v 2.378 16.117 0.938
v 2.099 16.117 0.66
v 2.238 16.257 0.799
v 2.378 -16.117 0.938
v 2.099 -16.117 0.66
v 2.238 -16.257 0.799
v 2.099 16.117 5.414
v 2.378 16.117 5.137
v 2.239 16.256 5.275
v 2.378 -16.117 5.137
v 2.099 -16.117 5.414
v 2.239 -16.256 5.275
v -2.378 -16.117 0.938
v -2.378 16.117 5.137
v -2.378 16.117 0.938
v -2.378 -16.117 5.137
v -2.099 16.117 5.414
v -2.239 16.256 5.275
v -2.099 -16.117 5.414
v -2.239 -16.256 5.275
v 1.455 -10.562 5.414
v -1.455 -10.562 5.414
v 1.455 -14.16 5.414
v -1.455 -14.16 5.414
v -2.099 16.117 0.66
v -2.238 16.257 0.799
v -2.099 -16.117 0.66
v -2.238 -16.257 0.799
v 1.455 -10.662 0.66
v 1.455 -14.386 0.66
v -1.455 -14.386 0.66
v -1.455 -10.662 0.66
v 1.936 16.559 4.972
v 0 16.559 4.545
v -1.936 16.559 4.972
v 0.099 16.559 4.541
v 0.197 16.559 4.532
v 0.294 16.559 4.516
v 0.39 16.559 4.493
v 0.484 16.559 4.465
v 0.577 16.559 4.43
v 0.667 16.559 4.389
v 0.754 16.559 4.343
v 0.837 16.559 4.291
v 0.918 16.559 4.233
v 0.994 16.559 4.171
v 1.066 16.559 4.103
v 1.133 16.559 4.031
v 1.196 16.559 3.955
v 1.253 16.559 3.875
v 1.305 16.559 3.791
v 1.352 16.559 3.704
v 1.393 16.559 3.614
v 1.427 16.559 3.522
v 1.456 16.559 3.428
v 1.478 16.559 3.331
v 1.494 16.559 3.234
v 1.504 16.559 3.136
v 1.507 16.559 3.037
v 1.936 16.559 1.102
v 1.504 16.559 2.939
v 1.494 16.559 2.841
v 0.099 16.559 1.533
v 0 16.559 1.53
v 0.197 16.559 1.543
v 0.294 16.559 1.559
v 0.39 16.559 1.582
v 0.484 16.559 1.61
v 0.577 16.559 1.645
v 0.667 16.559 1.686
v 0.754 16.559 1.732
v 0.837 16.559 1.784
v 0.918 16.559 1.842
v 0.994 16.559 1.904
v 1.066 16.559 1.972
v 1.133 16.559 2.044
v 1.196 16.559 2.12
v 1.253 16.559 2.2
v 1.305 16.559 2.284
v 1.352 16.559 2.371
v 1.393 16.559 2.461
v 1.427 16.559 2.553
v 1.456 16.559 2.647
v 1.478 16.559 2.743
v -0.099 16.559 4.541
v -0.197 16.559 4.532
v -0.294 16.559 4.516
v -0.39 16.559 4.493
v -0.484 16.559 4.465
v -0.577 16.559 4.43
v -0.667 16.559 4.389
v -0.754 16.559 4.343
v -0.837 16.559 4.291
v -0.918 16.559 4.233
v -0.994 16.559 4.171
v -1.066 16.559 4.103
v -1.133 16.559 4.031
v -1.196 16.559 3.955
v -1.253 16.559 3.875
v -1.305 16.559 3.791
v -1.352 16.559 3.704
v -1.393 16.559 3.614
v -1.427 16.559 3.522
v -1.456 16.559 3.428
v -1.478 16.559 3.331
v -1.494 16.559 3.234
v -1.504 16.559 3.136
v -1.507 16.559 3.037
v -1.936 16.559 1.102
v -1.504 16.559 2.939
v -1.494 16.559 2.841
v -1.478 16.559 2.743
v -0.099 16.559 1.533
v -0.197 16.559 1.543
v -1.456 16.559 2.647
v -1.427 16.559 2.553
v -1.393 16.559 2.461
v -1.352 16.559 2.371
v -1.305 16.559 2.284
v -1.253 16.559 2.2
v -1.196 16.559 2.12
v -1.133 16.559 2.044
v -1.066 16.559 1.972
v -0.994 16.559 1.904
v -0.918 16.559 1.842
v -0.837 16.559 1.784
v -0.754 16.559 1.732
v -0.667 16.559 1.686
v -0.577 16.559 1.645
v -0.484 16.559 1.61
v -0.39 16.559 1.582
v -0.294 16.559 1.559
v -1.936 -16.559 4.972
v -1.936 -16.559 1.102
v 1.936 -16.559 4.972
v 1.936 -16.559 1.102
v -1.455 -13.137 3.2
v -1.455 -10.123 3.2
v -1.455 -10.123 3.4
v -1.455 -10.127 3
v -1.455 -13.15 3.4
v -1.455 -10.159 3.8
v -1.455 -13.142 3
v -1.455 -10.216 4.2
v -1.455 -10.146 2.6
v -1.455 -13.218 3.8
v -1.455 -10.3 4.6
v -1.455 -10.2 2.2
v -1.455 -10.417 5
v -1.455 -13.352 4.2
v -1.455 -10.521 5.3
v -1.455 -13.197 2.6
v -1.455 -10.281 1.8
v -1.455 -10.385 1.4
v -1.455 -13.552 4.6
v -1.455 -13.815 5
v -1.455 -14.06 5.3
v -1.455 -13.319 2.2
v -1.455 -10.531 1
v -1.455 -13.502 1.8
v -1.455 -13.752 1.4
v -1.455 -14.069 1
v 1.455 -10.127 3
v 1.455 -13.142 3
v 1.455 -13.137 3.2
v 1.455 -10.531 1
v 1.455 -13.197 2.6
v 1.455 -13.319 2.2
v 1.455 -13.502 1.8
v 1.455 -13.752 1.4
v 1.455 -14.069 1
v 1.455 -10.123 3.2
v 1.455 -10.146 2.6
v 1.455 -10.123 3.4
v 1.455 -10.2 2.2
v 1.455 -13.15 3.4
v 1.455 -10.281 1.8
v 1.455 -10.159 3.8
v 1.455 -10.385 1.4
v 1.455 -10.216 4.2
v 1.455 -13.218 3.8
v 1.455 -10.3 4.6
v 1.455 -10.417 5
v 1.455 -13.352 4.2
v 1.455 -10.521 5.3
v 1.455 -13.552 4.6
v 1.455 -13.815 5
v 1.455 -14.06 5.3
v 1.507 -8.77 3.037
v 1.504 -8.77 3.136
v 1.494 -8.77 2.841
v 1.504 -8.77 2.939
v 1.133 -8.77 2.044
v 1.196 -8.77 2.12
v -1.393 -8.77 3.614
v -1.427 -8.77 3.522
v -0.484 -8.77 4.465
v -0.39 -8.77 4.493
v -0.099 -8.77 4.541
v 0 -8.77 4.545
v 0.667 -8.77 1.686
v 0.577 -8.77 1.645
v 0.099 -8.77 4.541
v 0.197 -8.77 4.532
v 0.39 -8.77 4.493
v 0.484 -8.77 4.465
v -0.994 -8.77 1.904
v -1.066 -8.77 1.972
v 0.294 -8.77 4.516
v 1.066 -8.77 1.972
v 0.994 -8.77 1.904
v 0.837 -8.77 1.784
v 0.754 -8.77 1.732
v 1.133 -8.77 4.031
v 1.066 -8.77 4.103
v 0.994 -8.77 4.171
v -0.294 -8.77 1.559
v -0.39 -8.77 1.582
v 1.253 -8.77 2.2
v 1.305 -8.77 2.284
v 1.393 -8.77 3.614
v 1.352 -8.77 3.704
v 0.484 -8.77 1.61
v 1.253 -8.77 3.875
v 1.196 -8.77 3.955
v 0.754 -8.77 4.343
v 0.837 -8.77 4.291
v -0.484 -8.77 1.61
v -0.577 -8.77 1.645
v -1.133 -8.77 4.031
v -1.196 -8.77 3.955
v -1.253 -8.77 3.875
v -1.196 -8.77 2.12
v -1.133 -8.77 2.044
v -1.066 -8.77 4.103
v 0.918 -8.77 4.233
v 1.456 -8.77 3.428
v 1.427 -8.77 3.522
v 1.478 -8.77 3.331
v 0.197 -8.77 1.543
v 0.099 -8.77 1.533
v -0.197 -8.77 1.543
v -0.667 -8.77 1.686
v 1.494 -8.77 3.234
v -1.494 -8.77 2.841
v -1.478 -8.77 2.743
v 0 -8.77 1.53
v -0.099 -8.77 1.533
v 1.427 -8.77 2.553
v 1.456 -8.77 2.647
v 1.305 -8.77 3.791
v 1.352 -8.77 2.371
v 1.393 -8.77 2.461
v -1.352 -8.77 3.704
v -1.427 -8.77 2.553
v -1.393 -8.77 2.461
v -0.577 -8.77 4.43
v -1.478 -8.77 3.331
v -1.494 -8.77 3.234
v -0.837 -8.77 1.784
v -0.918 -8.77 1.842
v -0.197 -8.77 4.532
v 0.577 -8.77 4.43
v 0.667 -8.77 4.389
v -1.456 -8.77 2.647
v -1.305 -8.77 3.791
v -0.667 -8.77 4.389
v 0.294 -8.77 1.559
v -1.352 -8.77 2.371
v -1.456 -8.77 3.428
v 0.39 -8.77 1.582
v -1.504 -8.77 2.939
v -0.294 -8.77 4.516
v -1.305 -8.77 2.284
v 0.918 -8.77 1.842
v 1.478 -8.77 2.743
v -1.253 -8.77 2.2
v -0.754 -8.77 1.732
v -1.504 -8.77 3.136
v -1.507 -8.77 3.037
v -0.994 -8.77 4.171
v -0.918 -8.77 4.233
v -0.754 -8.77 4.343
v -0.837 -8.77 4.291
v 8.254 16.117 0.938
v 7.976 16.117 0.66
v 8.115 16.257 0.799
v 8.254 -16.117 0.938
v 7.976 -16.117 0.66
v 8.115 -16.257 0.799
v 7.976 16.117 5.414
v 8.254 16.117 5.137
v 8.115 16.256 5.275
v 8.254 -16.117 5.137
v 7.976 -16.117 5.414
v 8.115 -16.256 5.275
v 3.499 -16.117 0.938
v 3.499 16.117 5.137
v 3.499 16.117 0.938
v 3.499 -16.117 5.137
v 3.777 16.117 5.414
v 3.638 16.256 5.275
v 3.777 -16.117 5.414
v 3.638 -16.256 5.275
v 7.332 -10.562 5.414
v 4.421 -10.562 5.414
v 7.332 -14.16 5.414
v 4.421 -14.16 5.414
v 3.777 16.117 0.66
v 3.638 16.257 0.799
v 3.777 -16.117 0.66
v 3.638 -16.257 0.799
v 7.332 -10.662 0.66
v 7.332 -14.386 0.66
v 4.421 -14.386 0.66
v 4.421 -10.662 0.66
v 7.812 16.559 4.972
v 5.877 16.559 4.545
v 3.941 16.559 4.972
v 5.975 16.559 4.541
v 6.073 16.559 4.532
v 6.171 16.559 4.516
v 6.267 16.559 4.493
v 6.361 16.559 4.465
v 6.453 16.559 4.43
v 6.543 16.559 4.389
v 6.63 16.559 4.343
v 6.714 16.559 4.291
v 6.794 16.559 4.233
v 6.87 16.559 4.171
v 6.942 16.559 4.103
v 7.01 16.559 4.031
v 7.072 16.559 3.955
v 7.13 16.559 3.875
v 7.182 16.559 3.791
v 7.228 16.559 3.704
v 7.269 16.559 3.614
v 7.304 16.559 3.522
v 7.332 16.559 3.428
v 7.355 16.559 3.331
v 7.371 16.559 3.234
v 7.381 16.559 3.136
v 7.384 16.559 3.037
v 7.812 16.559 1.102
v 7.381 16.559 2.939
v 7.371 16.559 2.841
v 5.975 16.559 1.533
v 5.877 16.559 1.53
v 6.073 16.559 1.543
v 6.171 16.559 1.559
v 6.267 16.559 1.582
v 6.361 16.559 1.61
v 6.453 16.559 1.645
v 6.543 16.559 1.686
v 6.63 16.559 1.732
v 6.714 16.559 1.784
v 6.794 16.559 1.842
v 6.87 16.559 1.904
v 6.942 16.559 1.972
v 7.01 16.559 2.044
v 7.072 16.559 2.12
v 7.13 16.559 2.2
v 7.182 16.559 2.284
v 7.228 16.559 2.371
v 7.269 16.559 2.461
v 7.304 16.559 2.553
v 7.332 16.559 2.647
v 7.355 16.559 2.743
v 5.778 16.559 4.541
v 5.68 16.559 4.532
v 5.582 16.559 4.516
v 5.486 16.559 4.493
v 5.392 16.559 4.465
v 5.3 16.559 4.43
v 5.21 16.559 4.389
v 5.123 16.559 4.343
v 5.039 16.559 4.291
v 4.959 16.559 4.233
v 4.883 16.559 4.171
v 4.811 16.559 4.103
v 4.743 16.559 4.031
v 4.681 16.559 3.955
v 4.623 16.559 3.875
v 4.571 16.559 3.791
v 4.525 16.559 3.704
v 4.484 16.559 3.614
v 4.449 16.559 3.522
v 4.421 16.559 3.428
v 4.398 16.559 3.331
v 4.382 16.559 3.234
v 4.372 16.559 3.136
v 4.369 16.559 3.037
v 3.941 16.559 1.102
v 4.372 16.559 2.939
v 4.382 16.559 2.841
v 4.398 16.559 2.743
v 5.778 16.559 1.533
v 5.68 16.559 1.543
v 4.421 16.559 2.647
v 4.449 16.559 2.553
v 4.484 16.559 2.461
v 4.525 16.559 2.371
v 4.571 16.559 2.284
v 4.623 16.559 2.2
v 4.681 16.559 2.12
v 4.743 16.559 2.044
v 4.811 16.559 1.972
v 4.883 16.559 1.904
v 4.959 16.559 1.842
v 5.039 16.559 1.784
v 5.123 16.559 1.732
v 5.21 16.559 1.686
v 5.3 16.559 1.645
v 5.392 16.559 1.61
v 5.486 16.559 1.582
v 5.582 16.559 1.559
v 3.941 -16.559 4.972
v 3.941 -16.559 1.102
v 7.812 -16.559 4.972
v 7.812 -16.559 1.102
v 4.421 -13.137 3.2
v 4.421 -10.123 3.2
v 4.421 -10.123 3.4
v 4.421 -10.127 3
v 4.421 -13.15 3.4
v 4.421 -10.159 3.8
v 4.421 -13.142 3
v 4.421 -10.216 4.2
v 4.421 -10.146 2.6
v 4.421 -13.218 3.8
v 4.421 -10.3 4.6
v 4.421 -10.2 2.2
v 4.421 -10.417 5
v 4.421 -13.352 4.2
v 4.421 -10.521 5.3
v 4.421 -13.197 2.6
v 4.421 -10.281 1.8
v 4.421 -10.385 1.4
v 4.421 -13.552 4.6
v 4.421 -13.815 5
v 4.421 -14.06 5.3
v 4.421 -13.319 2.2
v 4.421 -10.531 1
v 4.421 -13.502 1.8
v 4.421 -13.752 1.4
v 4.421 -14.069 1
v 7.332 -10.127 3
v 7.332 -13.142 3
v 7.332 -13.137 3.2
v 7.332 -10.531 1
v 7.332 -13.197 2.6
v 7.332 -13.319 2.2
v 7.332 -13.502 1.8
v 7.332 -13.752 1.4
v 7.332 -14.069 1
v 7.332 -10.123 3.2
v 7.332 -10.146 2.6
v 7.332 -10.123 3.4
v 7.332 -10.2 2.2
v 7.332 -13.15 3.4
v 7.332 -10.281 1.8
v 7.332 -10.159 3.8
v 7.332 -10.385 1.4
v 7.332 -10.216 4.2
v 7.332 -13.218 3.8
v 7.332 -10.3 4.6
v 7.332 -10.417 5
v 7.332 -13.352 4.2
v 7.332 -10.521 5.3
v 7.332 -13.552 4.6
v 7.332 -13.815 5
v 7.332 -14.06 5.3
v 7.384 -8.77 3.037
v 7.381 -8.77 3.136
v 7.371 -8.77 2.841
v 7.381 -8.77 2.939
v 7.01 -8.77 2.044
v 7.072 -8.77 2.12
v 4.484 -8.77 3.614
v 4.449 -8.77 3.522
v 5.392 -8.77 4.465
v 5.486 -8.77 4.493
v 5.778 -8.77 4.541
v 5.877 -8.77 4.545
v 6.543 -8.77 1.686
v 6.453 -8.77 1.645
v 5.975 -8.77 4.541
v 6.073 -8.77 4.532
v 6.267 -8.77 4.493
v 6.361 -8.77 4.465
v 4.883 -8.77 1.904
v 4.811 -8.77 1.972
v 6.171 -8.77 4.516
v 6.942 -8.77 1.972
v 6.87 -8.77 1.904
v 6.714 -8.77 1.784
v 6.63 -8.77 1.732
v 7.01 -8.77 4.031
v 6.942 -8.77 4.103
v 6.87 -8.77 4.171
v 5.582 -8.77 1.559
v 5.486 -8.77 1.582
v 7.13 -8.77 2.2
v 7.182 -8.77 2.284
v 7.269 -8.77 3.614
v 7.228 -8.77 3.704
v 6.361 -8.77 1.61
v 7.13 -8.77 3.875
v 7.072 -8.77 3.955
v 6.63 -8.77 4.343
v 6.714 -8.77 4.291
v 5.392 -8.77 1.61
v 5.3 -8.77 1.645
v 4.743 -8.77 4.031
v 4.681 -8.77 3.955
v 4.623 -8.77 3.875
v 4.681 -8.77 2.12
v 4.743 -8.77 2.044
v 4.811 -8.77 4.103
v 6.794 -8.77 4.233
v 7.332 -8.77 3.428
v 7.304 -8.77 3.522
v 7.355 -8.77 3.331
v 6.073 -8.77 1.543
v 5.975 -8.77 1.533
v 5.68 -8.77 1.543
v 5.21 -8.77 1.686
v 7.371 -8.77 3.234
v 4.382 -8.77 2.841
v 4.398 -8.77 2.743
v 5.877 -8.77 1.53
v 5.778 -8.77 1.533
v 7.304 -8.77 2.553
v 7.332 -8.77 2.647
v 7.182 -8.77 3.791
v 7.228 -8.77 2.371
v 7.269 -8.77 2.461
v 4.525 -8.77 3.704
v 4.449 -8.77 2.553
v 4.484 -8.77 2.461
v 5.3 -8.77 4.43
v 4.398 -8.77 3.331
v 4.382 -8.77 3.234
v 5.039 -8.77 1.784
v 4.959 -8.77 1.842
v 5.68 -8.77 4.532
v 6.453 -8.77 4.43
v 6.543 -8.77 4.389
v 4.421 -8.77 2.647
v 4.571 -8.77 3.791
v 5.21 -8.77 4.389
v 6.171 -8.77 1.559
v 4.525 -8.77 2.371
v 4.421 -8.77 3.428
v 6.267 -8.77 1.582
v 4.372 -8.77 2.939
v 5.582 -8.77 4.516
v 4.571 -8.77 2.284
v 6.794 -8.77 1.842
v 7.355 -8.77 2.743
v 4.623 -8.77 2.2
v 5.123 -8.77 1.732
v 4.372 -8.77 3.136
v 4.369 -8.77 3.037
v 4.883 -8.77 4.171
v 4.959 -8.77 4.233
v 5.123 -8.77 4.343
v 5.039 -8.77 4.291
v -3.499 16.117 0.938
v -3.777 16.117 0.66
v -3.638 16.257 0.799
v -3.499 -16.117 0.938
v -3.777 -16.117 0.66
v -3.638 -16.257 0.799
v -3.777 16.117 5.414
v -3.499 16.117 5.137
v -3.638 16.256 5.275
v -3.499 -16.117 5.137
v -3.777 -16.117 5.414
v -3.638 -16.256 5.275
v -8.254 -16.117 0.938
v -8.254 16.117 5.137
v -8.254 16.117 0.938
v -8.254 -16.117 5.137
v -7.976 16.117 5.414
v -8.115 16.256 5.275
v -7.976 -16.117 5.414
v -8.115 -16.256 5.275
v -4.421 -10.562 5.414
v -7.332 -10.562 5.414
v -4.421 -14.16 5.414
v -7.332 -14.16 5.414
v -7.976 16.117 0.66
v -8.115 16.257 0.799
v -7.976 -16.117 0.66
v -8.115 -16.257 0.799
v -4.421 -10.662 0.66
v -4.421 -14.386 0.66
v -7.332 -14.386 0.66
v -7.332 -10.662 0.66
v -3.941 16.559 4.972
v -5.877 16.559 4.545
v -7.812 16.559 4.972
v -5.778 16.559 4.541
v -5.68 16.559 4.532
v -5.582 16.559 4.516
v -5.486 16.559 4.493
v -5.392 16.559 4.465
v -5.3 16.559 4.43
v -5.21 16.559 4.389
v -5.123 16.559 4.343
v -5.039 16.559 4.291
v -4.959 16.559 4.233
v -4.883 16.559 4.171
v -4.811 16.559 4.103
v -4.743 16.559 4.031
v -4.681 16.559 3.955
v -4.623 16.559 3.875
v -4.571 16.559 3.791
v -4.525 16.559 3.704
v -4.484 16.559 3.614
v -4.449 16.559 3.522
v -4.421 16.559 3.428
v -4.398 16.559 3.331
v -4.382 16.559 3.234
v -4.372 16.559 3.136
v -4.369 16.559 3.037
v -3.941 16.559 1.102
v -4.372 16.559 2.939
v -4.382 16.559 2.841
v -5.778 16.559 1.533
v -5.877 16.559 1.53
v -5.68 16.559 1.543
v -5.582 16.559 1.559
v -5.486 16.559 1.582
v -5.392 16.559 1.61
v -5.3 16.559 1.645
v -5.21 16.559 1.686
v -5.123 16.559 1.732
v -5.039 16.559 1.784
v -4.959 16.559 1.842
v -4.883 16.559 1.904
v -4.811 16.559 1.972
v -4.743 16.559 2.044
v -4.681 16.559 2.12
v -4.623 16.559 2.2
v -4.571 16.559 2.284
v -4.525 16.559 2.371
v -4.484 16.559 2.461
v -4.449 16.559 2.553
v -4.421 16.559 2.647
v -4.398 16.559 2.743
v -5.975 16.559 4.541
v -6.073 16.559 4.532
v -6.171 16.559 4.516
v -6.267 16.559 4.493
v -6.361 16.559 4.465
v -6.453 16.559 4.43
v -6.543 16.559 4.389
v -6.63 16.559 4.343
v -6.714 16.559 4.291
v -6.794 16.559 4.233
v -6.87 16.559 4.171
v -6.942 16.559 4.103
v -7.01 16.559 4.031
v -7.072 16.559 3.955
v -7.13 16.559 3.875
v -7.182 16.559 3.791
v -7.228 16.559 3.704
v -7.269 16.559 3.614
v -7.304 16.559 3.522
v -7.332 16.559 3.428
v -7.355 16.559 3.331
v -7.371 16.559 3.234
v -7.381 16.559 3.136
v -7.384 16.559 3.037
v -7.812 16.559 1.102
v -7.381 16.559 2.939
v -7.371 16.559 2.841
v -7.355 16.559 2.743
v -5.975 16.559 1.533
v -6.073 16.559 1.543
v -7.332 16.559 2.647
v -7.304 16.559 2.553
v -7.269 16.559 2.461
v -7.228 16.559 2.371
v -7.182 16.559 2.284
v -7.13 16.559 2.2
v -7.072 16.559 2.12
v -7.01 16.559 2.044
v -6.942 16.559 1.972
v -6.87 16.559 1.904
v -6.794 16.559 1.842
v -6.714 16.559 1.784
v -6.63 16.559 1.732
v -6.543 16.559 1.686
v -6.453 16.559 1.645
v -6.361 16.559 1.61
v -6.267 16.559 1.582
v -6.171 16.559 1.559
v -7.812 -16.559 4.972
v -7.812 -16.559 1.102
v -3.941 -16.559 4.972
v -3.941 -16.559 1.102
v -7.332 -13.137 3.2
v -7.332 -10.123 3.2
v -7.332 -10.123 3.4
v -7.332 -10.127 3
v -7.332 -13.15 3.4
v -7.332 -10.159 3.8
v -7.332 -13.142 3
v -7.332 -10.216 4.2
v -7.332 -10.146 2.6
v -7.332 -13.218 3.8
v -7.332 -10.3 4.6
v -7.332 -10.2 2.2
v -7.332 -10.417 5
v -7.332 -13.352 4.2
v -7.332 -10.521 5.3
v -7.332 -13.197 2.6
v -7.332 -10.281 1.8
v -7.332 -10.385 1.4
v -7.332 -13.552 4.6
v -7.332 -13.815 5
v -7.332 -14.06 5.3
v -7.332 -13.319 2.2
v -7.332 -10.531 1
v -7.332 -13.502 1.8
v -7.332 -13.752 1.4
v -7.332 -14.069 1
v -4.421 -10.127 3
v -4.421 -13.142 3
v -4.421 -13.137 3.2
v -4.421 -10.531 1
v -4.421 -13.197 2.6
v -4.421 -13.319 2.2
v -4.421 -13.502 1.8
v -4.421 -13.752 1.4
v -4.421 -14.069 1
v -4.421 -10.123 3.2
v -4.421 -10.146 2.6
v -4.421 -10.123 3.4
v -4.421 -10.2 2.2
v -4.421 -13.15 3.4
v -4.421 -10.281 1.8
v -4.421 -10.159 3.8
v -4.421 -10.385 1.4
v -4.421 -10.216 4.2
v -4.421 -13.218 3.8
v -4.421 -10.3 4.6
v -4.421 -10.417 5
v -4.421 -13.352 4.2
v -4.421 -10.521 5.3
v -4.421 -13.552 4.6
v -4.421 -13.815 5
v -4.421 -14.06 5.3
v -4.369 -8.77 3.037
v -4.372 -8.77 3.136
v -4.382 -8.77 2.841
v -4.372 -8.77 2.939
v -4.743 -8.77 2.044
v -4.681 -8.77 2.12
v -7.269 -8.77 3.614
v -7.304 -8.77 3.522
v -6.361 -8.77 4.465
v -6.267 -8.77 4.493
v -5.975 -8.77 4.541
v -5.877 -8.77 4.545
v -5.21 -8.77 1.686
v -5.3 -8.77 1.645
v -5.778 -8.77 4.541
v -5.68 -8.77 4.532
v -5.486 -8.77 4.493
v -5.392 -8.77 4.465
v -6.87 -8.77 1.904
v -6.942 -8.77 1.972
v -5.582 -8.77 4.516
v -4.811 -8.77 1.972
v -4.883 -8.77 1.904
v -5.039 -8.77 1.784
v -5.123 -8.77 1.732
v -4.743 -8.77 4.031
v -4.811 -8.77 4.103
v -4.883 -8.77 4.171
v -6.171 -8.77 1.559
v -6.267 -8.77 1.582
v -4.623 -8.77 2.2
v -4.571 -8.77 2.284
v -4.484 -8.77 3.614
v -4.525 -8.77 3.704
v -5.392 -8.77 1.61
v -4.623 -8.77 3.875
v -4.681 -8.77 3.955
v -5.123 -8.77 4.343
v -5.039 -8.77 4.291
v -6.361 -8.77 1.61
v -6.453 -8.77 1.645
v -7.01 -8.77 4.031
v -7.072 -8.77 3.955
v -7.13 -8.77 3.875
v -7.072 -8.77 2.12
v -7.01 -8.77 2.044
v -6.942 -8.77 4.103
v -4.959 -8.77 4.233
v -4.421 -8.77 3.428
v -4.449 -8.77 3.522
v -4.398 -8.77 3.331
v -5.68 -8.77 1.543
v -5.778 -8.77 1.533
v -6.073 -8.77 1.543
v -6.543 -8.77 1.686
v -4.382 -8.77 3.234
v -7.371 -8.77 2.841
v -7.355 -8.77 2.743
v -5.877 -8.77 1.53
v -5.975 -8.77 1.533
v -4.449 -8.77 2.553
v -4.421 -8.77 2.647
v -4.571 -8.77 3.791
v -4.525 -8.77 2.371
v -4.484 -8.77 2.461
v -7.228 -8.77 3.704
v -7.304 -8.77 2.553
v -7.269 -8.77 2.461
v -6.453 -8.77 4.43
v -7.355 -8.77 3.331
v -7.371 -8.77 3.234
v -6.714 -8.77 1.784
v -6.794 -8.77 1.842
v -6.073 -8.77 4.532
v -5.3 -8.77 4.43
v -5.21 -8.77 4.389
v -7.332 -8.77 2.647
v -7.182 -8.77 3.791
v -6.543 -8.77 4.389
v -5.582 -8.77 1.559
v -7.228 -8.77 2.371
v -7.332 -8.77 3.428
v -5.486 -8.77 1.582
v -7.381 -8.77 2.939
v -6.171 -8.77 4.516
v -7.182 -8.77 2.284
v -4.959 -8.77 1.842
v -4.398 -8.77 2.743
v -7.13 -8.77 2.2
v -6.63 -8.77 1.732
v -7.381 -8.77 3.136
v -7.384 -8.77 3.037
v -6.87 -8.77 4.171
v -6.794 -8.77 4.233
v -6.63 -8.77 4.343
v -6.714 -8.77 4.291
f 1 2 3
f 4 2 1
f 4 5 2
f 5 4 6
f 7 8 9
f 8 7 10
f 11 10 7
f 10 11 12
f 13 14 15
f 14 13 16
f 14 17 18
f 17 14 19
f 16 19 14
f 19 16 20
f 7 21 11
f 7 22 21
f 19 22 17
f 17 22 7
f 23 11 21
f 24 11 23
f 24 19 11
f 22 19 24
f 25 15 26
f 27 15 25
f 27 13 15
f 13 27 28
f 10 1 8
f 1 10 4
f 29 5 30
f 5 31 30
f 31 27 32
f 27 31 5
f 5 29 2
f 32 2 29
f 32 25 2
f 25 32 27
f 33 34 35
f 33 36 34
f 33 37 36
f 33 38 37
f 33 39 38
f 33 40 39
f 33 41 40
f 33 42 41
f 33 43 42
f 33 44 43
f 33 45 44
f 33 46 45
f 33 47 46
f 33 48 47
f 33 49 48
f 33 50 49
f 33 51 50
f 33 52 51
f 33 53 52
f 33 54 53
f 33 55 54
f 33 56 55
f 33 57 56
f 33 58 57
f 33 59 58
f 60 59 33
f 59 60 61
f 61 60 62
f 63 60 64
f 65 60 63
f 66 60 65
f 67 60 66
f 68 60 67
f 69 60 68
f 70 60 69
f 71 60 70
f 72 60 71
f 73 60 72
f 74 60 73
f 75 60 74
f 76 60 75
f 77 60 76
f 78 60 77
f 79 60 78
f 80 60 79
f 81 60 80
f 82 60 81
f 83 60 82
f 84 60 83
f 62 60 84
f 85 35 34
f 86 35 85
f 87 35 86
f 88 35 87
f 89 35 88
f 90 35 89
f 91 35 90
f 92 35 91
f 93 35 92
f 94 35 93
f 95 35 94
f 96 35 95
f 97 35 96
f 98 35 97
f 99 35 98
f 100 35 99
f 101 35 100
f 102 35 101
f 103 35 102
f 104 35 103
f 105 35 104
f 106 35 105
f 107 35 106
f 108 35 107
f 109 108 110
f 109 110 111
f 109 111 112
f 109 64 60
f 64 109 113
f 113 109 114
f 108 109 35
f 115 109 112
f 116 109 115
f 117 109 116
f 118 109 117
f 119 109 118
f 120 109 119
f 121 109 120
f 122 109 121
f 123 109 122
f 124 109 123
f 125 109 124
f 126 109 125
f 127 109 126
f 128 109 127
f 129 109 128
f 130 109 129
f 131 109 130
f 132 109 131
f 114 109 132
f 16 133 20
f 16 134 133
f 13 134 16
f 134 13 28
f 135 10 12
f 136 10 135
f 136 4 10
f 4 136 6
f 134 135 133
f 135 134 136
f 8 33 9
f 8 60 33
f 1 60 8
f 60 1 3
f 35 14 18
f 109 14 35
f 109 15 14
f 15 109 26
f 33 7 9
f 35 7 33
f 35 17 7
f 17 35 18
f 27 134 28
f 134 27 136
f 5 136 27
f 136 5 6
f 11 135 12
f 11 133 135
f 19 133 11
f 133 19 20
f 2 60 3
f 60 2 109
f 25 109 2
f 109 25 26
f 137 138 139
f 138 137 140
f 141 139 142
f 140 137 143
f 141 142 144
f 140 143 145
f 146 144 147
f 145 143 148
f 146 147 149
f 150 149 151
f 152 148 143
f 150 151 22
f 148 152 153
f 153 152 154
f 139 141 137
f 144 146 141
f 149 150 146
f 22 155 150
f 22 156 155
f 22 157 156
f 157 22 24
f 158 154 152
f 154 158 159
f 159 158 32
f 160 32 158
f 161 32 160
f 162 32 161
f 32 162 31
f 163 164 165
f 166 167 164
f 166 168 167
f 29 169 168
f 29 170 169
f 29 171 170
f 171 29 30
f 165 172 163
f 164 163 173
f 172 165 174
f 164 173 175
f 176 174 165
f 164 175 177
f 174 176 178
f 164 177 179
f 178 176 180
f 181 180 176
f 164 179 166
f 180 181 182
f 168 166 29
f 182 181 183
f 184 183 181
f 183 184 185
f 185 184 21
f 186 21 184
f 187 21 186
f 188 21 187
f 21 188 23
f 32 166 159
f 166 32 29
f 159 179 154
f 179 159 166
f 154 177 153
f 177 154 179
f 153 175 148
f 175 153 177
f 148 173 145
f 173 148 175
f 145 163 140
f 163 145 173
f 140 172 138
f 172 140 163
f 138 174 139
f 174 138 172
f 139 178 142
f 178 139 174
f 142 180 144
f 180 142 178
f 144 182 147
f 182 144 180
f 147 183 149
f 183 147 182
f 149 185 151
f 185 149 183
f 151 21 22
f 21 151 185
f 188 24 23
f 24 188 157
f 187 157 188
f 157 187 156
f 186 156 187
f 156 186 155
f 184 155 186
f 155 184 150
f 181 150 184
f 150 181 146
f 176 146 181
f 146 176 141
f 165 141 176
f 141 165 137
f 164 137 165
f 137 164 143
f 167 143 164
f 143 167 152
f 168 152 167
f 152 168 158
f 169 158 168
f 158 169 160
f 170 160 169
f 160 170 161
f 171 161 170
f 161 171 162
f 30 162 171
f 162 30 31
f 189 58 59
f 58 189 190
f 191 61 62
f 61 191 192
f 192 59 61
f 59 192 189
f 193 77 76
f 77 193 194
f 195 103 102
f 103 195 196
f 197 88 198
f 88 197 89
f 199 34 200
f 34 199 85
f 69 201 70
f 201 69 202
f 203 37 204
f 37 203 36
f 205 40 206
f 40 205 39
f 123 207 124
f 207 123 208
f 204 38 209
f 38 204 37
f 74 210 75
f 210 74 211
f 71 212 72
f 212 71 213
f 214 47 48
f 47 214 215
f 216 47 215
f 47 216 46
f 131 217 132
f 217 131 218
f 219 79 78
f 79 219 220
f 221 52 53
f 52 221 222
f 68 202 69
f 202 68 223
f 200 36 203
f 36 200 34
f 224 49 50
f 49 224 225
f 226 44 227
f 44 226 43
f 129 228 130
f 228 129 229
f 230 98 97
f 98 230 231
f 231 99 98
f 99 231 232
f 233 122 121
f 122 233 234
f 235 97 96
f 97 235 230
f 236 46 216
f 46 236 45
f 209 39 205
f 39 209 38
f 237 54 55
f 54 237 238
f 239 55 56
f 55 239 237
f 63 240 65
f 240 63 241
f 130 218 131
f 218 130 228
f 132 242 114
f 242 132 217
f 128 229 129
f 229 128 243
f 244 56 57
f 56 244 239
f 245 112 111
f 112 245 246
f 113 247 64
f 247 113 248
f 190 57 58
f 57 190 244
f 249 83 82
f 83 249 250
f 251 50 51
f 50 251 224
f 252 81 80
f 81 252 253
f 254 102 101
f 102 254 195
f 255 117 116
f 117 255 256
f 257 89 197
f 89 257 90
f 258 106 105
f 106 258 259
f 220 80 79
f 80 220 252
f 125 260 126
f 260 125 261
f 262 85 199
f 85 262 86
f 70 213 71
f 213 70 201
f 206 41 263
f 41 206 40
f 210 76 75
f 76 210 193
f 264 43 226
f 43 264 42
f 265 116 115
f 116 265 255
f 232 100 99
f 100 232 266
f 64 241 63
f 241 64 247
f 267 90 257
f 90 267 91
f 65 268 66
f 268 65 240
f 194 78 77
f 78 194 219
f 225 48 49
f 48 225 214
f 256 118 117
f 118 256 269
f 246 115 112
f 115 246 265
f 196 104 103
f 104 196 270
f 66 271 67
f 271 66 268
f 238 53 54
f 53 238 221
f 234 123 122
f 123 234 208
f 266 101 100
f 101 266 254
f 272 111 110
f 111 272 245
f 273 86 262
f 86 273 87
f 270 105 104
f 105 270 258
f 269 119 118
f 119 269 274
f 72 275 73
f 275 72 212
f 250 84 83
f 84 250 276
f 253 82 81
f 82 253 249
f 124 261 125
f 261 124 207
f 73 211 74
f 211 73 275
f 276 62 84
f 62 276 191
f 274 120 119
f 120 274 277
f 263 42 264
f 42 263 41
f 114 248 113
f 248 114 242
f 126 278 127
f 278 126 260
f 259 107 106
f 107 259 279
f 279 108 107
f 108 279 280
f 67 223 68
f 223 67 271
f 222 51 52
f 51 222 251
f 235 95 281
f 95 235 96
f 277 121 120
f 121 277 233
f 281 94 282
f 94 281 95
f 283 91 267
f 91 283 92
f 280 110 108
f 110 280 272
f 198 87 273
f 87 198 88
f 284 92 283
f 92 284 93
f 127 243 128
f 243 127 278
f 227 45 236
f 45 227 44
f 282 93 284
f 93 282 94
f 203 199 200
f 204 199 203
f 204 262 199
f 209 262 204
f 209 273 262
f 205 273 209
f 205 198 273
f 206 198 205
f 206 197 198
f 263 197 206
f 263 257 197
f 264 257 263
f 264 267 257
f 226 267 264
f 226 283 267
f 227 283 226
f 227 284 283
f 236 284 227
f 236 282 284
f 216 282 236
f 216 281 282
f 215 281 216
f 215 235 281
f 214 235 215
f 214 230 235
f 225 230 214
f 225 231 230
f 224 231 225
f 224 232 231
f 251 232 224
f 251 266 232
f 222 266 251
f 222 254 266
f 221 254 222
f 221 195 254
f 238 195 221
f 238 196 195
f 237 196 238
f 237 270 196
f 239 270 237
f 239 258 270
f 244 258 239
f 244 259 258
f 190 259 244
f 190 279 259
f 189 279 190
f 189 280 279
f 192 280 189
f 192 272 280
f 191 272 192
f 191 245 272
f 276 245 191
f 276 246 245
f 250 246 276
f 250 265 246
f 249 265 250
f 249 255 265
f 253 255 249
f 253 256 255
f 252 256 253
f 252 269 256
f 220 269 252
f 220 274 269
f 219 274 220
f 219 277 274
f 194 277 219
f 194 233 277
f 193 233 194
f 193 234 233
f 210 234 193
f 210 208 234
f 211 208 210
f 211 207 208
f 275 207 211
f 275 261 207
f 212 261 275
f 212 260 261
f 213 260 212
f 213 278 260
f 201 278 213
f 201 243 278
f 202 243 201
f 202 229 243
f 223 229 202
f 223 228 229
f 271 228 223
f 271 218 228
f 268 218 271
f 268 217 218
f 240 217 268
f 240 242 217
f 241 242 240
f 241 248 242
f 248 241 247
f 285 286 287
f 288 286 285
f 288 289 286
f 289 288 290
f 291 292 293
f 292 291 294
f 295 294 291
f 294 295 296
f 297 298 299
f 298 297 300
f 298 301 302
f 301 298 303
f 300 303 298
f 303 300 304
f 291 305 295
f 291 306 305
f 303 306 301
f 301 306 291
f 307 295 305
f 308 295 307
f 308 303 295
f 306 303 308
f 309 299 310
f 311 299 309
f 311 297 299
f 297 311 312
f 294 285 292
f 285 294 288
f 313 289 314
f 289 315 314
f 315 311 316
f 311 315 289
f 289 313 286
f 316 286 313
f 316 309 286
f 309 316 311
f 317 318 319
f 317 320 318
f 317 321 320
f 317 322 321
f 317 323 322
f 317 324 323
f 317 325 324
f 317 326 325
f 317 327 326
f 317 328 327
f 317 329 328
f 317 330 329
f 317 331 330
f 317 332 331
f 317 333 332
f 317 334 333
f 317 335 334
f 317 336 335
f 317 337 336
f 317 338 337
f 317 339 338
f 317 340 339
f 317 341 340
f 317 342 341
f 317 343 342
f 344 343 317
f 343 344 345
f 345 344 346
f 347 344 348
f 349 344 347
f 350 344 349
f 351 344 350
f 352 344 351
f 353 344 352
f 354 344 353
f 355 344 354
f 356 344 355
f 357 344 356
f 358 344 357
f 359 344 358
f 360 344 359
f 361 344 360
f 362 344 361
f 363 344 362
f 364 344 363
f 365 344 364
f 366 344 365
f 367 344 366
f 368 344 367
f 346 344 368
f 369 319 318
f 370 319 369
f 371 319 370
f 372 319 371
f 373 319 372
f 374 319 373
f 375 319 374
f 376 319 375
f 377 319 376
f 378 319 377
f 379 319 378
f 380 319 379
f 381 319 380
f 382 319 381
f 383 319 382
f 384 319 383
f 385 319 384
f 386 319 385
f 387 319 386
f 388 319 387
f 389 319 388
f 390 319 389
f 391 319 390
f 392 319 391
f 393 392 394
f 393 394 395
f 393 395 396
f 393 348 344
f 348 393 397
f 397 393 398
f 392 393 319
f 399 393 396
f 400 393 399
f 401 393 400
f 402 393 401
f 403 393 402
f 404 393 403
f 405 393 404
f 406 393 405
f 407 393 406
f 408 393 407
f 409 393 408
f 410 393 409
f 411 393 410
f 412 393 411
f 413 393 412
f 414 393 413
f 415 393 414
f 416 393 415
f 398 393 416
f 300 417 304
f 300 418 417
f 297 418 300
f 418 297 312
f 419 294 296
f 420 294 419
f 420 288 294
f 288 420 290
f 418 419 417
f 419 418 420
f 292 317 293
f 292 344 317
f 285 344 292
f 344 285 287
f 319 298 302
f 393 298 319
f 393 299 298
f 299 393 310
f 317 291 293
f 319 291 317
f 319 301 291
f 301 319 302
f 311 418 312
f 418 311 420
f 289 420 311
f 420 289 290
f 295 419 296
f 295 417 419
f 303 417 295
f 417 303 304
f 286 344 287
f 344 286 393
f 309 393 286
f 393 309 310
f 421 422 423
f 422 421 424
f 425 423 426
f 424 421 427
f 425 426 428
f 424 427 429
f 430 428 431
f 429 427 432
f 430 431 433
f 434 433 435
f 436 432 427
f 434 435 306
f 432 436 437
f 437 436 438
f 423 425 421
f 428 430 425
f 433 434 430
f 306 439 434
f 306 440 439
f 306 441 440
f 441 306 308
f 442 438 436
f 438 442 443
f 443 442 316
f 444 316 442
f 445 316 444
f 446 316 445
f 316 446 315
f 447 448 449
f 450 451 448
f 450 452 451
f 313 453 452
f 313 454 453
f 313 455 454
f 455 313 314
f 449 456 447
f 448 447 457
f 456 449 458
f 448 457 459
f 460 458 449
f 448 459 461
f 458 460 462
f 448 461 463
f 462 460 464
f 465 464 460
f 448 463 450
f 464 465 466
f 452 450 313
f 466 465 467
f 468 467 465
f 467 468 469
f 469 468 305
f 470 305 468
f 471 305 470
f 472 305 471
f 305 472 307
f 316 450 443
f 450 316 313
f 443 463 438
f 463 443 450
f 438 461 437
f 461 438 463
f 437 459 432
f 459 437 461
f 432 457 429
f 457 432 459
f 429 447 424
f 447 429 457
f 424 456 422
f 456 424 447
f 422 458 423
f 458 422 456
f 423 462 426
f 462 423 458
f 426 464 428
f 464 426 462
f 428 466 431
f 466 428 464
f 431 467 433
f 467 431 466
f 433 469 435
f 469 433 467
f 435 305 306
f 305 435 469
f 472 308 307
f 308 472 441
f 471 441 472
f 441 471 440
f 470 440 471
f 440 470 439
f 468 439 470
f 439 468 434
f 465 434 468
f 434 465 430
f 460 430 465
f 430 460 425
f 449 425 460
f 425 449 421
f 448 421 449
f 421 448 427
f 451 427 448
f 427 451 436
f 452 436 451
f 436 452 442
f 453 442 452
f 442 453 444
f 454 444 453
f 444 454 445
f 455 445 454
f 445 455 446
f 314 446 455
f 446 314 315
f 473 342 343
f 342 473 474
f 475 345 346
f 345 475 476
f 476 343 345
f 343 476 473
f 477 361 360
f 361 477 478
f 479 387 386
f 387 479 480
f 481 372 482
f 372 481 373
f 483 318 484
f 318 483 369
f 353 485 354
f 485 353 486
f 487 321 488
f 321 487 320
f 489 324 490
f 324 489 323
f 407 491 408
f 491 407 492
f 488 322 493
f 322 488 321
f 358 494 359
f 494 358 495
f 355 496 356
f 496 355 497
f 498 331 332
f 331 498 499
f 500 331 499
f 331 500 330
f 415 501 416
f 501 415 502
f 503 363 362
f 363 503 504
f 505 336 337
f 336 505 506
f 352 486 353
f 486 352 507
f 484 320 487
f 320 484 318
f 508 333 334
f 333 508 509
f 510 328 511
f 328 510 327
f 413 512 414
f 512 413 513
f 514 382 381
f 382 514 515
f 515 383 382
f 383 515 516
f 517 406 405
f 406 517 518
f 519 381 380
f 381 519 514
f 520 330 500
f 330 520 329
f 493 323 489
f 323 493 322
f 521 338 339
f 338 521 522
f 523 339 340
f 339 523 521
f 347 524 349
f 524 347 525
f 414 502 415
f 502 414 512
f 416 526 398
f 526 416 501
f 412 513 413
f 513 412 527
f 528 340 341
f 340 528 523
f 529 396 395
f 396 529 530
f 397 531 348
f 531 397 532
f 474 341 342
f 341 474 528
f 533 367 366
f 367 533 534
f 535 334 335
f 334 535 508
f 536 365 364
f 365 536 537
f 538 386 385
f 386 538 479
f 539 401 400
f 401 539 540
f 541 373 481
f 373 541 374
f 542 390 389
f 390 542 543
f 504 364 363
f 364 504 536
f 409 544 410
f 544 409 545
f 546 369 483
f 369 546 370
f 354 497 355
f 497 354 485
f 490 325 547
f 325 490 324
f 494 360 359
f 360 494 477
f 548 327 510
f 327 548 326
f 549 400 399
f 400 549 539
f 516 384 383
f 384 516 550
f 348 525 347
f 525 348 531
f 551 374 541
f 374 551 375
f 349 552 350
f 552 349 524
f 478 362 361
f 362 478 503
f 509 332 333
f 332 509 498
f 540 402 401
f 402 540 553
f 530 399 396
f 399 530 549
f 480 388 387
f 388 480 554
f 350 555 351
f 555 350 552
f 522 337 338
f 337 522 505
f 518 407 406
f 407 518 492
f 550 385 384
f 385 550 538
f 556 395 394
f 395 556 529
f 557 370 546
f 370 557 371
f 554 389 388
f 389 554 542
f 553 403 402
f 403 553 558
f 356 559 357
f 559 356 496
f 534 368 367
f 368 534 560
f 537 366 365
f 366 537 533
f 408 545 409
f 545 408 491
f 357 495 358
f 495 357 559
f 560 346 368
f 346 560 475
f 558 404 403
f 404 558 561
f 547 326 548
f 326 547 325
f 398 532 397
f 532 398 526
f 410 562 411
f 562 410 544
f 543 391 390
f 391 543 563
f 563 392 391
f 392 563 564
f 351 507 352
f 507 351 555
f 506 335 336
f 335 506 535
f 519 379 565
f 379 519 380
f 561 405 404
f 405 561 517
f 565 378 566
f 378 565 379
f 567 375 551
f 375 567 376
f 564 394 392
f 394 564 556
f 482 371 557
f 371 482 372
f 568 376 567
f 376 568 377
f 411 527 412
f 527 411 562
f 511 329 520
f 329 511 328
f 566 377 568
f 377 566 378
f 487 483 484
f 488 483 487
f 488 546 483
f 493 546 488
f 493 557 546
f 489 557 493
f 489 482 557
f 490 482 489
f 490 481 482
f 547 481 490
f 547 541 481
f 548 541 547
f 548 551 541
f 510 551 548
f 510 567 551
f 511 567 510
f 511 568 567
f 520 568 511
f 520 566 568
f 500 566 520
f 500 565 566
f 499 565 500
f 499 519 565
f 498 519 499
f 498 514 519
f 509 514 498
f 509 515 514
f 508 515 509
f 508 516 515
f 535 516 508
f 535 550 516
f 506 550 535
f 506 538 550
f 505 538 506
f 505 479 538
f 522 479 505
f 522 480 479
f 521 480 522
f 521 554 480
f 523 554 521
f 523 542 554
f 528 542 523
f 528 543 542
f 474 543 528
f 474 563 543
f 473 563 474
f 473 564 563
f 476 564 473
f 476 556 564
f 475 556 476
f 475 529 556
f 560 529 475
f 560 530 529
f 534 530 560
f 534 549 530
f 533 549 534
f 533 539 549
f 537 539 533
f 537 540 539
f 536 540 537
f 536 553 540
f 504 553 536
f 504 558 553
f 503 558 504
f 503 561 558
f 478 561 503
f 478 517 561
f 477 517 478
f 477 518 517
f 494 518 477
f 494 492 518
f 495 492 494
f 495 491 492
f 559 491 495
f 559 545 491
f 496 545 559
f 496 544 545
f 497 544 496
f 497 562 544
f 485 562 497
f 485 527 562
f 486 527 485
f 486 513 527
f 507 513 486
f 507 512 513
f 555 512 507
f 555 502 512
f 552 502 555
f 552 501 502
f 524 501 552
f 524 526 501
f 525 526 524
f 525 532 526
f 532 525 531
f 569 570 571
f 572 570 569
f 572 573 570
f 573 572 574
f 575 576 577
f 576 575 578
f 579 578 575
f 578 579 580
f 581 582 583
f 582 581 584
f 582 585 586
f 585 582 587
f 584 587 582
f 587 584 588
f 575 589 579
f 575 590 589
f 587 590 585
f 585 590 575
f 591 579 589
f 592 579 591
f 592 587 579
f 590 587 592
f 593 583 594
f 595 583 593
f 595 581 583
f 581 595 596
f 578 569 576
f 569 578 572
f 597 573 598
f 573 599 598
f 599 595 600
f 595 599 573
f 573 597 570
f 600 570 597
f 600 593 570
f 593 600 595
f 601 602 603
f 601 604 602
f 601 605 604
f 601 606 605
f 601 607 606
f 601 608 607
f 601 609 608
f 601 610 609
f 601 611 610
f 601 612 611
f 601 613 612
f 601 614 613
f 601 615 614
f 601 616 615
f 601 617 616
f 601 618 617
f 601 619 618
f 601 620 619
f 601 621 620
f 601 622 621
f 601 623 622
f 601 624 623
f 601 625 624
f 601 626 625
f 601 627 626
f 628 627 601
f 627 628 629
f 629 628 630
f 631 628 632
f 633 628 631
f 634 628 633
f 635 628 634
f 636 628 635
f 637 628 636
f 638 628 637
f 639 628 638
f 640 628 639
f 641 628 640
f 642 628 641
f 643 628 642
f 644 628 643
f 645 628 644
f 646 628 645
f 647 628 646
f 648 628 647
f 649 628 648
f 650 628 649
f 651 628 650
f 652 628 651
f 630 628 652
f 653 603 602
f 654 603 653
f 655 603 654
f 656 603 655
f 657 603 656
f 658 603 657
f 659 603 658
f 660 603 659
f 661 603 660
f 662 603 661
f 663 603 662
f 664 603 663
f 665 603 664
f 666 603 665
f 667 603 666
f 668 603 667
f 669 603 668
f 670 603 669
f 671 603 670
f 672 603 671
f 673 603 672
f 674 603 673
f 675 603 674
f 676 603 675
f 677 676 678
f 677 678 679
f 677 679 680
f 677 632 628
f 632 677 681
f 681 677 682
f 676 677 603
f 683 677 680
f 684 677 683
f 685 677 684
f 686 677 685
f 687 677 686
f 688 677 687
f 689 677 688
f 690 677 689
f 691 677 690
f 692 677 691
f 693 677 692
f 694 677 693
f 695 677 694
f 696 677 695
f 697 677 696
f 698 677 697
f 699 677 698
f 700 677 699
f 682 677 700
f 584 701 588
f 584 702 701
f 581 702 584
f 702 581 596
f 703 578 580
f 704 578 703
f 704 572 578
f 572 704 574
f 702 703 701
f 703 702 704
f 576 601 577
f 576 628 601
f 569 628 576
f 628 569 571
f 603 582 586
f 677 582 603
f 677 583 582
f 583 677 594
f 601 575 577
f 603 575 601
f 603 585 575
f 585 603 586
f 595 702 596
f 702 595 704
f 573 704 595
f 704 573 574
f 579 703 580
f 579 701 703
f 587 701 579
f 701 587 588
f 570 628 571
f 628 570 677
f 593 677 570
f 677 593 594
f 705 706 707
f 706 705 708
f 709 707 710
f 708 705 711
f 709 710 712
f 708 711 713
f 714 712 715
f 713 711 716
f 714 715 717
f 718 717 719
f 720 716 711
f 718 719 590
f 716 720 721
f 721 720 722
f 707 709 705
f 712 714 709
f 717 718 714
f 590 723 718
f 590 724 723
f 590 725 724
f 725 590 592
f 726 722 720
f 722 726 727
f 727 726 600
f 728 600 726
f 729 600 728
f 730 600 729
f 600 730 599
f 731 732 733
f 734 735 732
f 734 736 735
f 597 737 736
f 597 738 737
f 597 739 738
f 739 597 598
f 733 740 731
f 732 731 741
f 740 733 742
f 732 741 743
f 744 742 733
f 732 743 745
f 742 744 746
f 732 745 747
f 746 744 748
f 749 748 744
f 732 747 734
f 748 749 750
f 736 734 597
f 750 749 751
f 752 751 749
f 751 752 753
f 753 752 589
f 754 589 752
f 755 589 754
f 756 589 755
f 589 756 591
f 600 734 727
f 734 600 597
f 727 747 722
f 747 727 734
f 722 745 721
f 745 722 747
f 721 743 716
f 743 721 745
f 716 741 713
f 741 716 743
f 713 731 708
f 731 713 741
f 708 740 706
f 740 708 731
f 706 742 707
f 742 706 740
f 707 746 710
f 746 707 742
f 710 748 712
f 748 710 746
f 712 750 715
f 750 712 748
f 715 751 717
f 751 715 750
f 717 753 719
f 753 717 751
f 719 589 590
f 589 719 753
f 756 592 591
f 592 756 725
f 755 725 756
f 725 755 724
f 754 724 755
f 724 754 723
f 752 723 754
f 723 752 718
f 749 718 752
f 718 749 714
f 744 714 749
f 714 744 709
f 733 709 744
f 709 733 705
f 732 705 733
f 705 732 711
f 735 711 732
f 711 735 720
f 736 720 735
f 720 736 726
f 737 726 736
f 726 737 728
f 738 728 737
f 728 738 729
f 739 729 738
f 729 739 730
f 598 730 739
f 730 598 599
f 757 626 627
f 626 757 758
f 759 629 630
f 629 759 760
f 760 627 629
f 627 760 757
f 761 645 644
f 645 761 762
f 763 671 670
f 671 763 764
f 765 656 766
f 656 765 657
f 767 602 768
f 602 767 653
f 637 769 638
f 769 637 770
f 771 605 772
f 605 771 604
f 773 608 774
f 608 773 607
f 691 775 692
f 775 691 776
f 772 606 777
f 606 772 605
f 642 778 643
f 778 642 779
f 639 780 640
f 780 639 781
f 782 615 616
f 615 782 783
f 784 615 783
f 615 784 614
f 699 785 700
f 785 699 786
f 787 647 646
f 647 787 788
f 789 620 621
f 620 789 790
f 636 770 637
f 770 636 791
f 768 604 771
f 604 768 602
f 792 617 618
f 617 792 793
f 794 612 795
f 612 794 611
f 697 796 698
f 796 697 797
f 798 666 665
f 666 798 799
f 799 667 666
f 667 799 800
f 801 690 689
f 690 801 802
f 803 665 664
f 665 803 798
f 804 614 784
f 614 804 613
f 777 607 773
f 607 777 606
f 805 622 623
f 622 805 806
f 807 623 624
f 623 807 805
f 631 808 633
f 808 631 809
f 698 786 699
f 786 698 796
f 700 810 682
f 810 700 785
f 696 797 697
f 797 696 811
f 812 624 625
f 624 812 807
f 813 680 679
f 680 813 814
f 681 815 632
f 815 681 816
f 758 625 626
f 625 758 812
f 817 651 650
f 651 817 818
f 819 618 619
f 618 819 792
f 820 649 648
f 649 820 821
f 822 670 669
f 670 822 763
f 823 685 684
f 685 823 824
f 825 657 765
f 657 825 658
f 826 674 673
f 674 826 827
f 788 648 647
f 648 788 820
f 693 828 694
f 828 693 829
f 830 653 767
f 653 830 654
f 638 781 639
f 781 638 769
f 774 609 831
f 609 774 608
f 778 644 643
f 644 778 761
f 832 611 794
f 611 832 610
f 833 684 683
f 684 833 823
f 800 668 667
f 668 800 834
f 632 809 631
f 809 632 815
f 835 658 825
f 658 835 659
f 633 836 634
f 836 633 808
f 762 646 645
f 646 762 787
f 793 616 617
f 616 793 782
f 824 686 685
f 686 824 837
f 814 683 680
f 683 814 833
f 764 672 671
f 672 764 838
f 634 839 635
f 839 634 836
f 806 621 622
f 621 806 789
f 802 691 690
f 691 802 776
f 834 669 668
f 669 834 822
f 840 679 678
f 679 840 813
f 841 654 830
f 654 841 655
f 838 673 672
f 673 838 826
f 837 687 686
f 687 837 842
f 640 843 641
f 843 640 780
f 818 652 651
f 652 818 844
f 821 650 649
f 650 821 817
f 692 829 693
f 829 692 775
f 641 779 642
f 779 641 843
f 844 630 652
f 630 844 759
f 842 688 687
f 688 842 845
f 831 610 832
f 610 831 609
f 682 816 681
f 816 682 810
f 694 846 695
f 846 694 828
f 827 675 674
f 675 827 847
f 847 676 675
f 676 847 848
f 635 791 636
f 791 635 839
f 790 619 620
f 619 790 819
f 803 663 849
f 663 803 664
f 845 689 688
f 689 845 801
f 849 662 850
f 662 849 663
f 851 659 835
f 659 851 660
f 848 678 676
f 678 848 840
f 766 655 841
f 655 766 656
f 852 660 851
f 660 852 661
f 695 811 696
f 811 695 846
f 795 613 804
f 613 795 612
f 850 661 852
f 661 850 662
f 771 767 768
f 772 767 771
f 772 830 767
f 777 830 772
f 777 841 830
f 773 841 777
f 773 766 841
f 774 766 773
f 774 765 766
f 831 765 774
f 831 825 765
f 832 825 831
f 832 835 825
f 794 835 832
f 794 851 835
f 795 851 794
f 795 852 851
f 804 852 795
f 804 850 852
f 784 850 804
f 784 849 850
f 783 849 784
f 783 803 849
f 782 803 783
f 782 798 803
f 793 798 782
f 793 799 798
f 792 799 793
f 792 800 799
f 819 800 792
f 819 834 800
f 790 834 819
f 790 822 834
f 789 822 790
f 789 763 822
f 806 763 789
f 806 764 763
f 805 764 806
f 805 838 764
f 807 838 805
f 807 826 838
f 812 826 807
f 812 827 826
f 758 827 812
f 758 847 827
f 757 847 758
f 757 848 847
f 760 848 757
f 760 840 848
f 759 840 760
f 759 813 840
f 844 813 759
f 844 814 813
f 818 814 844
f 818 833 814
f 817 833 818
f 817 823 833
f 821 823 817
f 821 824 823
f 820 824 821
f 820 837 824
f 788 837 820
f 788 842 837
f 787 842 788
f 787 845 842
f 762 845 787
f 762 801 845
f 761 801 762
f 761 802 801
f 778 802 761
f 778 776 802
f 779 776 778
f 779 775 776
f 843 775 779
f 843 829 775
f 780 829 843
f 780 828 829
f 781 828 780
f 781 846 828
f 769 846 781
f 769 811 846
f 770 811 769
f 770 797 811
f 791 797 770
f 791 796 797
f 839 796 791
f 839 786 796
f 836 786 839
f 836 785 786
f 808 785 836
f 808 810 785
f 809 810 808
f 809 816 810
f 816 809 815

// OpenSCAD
// Tensioner_Pins — step2scad parametric reconstruction
// source: models/phoenix_components/Tensioner_Pins.step
// rotate_extrude bodies: exact RZ profile from the B-rep coaxial faces;
// csg / instance_of bodies: agent-authored measured plan (plan.json);
// strategies without a real emitter yet use placeholder stubs (bbox).
// Every dimension below is an exact B-rep value from features.json.

// ---- body 0 (strategy: csg — agent plan) ----
// plan: chamfered bar = intersection of three measured octagonal prisms; minus tendon slot (prismatic in x, raycast-measured conic walls); minus blind tendon bore (exact cylinder+cap)
b0_xsec_profile = [[0.659863, 2.099167], [0.938279, 2.377583], [5.136614, 2.377583], [5.413925, 2.099167], [5.413925, -2.099168], [5.136614, -2.377583], [0.938279, -2.377583], [0.659863, -2.099168]];  // (z, x) points — XZ octagon: exact plane faces 0/31 (walls x=±2.377583), 15 (top z=5.413925), 24 (bottom z=0.659863), 13/25 (45° bottom chamfers), 14/30 (top chamfers); vertices = plane-pair intersections
b0_xsec_z0 = -16.559241;  // extent along y
b0_xsec_z1 = 16.559241;
b0_plan_xy_profile = [[2.377583, 16.117311], [1.935653, 16.559241], [-1.935653, 16.559241], [-2.377583, 16.117311], [-2.377583, -16.117311], [-1.935653, -16.559241], [1.935653, -16.559241], [2.377583, -16.117311]];  // (x, y) points — XY octagon: exact plane faces 0/31, 16/23 (ends y=±16.559241), 4/7/26/28 (45° corner chamfers)
b0_plan_xy_z0 = 0;  // extent along z
b0_plan_xy_z1 = 6;
b0_side_yz_profile = [[16.117311, 0.659863], [16.559241, 1.101793], [16.559241, 4.971995], [16.117311, 5.413925], [-16.117311, 5.413925], [-16.559241, 4.971995], [-16.559241, 1.101793], [-16.117311, 0.659863]];  // (y, z) points — YZ octagon: exact plane faces 16/23, 15, 24, 17/20 (top end chamfers), 18/21 (bottom end chamfers)
b0_side_yz_z0 = -2.5;  // extent along x
b0_side_yz_z1 = 2.5;
b0_slot_profile = [[-14.722041, 0.3], [-14.348953, 0.7], [-14.069137, 1], [-13.751725, 1.4], [-13.501885, 1.8], [-13.318744, 2.2], [-13.197268, 2.6], [-13.141806, 3], [-13.137367, 3.2], [-13.150415, 3.4], [-13.21782, 3.8], [-13.352434, 4.2], [-13.551634, 4.6], [-13.814756, 5], [-14.060239, 5.3], [-14.147448, 5.4], [-14.496284, 5.8], [-10.702936, 5.8], [-10.557256, 5.4], [-10.520836, 5.3], [-10.416808, 5], [-10.299863, 4.6], [-10.216109, 4.2], [-10.159263, 3.8], [-10.123424, 3.4], [-10.122524, 3.2], [-10.12681, 3], [-10.146129, 2.6], [-10.200298, 2.2], [-10.281356, 1.8], [-10.384704, 1.4], [-10.530743, 1], [-10.646316, 0.7], [-10.800413, 0.3]];  // (y, z) points — tendon slot between bspline faces 11/12: wall y(z) raycast-measured at x=0 (prismatic: <0.003mm variation across x); x span = exact plane faces 9/10 (x=±1.455185); z overshoot 0.3/5.8 extrapolates the last measured segment
b0_slot_z0 = -1.455185;  // extent along x
b0_slot_z1 = 1.455184;
b0_bore_p0 = [0, -8.770356, 3.037447];  // blind tendon bore: exact cylinder face 2 (r=1.507237, axis [0,-1,0] through x=0 z=3.037447) + planar cap face 1 at y=-8.770356; +y end overshoots the exit face 16 by ~1mm
b0_bore_p1 = [0, 17.559241, 3.037447];
b0_bore_r  = 1.507237;
b0_fn = 96;  // curve resolution

module body_0() {
    difference() {
        intersection() {
            // xsec: XZ octagon: exact plane faces 0/31 (walls x=±2.377583), 15 (top z=5.413925), 24 (bottom z=0.659863), 13/25 (45° bottom chamfers), 14/30 (top chamfers); vertices = plane-pair intersections
            rotate([0, -90, -90]) translate([0, 0, b0_xsec_z0]) linear_extrude(b0_xsec_z1 - b0_xsec_z0) polygon(b0_xsec_profile);
            // plan_xy: XY octagon: exact plane faces 0/31, 16/23 (ends y=±16.559241), 4/7/26/28 (45° corner chamfers)
            translate([0, 0, b0_plan_xy_z0]) linear_extrude(b0_plan_xy_z1 - b0_plan_xy_z0) polygon(b0_plan_xy_profile);
            // side_yz: YZ octagon: exact plane faces 16/23, 15, 24, 17/20 (top end chamfers), 18/21 (bottom end chamfers)
            rotate([90, 0, 90]) translate([0, 0, b0_side_yz_z0]) linear_extrude(b0_side_yz_z1 - b0_side_yz_z0) polygon(b0_side_yz_profile);
        }
        // slot: tendon slot between bspline faces 11/12: wall y(z) raycast-measured at x=0 (prismatic: <0.003mm variation across x); x span = exact plane faces 9/10 (x=±1.455185); z overshoot 0.3/5.8 extrapolates the last measured segment
        rotate([90, 0, 90]) translate([0, 0, b0_slot_z0]) linear_extrude(b0_slot_z1 - b0_slot_z0) polygon(b0_slot_profile);
        // bore: blind tendon bore: exact cylinder face 2 (r=1.507237, axis [0,-1,0] through x=0 z=3.037447) + planar cap face 1 at y=-8.770356; +y end overshoots the exit face 16 by ~1mm
        translate(b0_bore_p0) rotate(a=90, v=[-1, 0, 0]) cylinder(h=norm(b0_bore_p1 - b0_bore_p0), r=b0_bore_r, $fn=b0_fn);
    }
}

// ---- body 1 (strategy: instance_of body 0 — agent plan) ----
b1_offset = [5.8765, 0, 0];  // exact centroid delta body1-body0 (identical volume/faces)

module body_1() {
    translate(b1_offset) body_0();
}

// ---- body 2 (strategy: instance_of body 0 — agent plan) ----
b2_offset = [-5.8765, 0, 0];  // exact centroid delta body2-body0 (identical volume/faces)

module body_2() {
    translate(b2_offset) body_0();
}

// full part = union of all bodies
body_0();
body_1();
body_2();
